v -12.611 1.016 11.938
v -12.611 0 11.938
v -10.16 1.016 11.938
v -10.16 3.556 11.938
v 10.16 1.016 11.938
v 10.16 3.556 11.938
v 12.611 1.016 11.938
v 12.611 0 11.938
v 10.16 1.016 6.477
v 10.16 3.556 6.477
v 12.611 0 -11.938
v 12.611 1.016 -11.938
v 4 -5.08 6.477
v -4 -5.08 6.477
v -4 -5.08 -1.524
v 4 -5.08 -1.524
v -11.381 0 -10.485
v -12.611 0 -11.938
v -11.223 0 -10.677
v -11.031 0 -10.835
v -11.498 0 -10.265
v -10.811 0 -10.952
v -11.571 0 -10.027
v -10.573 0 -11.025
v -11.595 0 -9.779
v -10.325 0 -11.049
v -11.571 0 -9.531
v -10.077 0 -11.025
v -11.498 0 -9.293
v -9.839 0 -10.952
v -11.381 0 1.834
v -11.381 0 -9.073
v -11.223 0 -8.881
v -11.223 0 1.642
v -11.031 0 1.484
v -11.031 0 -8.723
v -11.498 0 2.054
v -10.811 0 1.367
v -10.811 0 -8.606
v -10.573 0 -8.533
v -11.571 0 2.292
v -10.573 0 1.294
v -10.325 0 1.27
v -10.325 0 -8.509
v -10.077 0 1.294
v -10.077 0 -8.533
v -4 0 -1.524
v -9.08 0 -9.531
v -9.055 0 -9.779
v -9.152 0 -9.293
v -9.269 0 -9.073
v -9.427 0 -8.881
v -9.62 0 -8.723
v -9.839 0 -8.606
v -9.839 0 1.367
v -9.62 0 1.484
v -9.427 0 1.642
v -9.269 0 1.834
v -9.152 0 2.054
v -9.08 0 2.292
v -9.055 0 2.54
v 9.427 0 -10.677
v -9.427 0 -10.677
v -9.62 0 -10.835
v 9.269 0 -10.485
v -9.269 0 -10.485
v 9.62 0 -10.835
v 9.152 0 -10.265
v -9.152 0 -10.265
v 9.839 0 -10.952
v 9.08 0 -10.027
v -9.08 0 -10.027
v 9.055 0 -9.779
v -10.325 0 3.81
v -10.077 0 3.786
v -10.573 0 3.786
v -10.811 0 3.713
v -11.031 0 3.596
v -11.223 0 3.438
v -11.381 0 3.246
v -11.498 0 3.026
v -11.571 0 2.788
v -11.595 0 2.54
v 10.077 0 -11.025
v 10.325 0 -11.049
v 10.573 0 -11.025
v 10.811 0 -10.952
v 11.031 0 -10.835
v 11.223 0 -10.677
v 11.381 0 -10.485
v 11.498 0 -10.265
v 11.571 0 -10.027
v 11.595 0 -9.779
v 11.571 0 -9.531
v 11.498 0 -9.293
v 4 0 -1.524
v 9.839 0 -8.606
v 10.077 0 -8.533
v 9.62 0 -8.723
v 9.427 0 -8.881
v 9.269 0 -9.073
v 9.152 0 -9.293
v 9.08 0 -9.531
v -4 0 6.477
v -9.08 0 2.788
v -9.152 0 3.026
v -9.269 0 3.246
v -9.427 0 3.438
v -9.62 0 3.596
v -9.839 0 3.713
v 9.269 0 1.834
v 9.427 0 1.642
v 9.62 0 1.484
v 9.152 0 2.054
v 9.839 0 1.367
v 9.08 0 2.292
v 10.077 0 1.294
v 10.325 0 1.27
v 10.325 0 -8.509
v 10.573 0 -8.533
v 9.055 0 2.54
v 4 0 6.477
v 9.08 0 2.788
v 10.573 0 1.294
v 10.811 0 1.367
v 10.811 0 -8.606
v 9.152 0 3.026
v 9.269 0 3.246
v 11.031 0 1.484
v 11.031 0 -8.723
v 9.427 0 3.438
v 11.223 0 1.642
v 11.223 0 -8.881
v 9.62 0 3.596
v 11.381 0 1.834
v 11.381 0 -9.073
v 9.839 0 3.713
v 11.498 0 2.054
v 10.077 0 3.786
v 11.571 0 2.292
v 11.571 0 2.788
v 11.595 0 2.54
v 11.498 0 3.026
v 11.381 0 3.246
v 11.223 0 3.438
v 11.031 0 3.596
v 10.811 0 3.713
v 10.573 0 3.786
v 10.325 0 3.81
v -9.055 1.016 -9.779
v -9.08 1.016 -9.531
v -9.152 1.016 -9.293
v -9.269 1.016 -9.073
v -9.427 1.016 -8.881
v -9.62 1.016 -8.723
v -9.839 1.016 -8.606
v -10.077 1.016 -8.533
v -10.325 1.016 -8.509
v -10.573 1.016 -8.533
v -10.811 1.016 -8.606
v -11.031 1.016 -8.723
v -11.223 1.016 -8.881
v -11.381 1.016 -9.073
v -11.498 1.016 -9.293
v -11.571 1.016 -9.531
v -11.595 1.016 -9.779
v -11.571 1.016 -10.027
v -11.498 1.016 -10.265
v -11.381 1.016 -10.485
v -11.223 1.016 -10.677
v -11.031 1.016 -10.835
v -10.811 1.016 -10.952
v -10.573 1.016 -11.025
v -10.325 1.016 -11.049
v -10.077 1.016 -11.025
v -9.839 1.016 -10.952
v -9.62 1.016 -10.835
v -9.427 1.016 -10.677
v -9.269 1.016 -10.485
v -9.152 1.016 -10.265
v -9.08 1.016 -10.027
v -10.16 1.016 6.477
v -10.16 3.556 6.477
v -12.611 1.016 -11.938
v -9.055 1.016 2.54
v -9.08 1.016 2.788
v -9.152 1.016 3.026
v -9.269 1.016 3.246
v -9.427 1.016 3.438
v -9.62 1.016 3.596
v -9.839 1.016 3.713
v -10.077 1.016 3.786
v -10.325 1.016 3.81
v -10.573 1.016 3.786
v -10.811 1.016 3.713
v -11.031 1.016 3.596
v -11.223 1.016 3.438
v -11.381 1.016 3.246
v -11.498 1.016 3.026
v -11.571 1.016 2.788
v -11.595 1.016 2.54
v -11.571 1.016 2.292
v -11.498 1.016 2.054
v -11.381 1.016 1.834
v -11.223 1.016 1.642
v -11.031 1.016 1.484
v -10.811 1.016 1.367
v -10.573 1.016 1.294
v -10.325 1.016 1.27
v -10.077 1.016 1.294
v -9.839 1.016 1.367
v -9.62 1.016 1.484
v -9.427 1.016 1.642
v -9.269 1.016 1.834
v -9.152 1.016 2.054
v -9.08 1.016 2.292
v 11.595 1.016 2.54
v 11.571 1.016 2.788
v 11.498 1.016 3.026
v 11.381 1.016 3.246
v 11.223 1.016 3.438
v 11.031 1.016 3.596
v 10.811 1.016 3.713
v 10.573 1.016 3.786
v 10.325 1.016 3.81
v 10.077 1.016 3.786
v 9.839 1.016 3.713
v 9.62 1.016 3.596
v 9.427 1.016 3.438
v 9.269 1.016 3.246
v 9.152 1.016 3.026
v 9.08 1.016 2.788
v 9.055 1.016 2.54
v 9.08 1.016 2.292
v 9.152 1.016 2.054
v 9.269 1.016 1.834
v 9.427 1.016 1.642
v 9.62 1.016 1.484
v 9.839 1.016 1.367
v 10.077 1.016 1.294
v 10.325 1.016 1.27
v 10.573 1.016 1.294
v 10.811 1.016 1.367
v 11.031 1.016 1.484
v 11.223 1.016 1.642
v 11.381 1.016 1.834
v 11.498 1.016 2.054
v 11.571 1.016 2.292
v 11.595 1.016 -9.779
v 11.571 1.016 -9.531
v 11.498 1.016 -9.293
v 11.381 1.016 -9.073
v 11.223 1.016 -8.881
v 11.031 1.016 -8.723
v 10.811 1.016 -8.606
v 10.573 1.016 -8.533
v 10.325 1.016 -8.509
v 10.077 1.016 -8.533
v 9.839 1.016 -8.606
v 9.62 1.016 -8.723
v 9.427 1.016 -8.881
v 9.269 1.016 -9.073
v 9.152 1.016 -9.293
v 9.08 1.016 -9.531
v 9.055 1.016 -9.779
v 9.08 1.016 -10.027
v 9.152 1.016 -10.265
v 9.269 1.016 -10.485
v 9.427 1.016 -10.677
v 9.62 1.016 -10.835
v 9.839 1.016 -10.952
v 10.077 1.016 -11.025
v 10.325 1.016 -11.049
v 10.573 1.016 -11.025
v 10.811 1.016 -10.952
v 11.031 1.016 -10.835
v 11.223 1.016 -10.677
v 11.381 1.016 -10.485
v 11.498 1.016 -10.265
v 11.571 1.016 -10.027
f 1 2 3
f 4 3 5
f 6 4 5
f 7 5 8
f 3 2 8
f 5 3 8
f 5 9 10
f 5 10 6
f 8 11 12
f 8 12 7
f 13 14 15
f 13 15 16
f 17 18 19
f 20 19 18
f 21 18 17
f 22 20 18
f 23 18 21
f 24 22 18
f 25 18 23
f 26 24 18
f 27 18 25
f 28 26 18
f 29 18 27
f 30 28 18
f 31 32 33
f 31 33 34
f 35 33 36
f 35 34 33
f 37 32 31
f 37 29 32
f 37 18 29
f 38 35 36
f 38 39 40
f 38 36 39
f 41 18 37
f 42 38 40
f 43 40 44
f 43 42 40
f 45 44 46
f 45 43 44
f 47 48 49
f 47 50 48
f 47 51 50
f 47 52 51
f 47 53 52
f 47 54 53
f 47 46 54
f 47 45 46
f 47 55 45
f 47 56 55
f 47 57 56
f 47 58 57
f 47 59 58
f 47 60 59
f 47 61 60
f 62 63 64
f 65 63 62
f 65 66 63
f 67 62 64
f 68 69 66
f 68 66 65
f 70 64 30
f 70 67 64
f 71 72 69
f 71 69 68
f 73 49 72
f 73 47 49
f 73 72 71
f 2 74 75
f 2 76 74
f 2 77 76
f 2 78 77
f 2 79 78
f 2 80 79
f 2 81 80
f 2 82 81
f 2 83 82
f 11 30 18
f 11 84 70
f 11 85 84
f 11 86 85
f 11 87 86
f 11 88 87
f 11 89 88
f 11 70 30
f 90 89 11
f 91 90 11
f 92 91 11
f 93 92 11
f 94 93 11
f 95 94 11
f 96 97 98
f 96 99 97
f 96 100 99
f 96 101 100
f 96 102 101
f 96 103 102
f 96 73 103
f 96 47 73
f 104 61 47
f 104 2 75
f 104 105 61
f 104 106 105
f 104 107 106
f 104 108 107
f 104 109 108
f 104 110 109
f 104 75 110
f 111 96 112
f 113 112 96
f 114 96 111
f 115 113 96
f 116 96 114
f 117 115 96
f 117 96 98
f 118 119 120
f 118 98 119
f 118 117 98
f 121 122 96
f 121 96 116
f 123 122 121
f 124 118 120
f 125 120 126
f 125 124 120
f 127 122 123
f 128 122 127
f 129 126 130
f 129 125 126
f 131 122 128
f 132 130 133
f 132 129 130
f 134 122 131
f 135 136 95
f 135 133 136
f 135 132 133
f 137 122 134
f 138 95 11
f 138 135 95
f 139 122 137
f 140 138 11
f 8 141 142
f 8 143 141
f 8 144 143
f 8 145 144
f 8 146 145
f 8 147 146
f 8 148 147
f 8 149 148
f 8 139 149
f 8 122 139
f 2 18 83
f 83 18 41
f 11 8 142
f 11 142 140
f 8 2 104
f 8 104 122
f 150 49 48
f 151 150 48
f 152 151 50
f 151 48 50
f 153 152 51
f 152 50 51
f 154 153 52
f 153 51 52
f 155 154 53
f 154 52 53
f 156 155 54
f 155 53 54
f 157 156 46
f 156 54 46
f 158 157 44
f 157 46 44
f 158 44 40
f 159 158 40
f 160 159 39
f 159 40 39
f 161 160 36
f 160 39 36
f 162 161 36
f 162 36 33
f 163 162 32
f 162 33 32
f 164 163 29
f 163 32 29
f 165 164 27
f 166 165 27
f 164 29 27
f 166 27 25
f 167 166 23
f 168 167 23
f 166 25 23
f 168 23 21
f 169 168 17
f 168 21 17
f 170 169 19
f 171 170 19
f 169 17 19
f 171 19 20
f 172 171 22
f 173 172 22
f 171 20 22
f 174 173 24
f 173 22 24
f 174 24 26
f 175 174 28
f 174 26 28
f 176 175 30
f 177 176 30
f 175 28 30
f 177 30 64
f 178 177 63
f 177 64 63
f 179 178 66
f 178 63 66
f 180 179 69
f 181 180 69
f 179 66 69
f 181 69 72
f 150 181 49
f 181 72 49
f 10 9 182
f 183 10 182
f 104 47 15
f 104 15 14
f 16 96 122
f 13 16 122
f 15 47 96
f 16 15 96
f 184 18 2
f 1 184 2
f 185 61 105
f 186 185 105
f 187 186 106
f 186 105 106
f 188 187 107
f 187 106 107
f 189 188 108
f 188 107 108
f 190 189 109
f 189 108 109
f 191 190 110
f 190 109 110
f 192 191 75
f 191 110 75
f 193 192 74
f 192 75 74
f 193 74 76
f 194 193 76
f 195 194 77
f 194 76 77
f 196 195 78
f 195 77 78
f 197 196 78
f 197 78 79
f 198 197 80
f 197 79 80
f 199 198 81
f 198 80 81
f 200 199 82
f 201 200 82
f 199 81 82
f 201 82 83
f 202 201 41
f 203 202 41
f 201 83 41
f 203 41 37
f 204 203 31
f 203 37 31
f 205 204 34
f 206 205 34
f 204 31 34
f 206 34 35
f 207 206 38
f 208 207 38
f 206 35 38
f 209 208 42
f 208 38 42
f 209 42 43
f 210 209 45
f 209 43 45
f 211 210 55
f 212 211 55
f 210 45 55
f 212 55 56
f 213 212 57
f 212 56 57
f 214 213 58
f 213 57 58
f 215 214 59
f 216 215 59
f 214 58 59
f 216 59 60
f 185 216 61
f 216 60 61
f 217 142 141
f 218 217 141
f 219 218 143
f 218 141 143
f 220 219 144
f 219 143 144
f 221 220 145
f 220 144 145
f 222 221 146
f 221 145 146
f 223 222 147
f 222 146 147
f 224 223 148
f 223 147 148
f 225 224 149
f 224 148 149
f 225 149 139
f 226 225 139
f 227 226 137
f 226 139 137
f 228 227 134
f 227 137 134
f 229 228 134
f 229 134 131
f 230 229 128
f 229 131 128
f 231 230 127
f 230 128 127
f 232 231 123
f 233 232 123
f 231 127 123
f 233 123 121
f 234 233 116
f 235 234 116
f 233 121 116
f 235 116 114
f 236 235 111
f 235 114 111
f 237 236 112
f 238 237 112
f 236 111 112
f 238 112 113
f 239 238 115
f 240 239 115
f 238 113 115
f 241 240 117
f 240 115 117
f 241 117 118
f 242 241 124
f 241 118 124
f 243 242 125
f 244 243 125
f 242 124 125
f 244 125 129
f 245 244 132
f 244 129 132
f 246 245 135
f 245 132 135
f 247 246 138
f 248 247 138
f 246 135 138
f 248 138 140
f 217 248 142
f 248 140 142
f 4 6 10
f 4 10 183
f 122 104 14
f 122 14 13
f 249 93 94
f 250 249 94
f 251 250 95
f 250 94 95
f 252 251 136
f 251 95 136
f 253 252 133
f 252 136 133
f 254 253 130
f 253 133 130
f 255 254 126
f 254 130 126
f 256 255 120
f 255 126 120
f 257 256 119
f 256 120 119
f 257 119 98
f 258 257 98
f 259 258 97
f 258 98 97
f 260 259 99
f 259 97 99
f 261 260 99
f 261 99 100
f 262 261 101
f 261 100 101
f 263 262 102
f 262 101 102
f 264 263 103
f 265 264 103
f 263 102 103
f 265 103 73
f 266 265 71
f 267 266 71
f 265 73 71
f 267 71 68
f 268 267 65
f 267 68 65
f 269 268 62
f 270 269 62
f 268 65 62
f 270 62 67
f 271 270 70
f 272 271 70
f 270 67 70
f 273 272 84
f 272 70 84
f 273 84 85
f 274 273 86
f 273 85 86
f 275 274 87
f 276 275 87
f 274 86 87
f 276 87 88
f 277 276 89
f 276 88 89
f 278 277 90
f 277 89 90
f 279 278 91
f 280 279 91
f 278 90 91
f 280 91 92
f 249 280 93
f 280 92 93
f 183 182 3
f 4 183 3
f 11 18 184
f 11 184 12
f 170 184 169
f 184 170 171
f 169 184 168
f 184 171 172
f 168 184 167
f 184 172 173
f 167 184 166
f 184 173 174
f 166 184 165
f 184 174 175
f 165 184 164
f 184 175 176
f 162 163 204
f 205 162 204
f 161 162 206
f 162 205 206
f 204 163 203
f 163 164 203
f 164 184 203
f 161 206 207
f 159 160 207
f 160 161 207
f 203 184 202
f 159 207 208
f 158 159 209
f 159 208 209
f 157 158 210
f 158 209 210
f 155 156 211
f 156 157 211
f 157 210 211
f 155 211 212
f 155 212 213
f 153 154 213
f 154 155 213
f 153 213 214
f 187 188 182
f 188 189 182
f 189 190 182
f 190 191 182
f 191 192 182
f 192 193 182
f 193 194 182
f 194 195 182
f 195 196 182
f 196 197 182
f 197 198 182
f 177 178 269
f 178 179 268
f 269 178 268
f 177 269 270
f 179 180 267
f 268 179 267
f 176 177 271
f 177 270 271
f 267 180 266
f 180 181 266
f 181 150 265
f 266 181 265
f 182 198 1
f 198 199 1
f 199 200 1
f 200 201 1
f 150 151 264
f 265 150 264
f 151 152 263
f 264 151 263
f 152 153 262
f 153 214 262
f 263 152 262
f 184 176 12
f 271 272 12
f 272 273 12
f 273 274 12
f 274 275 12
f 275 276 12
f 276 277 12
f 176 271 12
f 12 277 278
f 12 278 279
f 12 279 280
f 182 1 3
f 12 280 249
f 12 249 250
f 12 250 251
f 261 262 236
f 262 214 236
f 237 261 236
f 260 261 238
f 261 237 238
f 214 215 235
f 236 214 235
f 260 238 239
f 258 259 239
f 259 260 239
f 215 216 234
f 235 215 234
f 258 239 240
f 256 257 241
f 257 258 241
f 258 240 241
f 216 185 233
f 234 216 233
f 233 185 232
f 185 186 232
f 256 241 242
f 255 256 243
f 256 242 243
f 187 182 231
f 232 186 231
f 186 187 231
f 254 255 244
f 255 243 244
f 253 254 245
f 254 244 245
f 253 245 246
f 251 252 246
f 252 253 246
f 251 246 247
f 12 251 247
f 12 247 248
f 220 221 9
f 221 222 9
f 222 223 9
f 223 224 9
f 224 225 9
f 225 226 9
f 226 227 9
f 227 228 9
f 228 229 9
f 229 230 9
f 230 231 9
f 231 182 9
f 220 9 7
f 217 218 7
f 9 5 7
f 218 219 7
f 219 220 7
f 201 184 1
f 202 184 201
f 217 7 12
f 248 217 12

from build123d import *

# Parameters (mm, degrees)
F0_W     = 25.2222
F0_H     = 23.876
F0_R     = 1.27
F1_DEPTH = 1.016
F2_W     = 8.001
F2_H     = 8.001
F3_DEPTH = 5.08
F4_W     = 20.32
F4_H     = 5.461
F5_DEPTH = 2.54


with BuildPart() as f1:
    # F0 (on Front) → F1 (new body)
    with BuildSketch(Plane.XZ):
        Rectangle(F0_W, F0_H)
        with Locations((-10.3251, -9.779)):
            Circle(F0_R, mode=Mode.SUBTRACT)
        with Locations((10.3251, -9.779)):
            Circle(F0_R, mode=Mode.SUBTRACT)
        with Locations((-10.3251, 2.54)):
            Circle(F0_R, mode=Mode.SUBTRACT)
        with Locations((10.3251, 2.54)):
            Circle(F0_R, mode=Mode.SUBTRACT)
    extrude(amount=-F1_DEPTH)

    # F2 (on face) → F3 (join)
    with BuildSketch(Plane.XZ):
        with Locations((0, 2.4765)):
            Rectangle(F2_W, F2_H)
    extrude(amount=F3_DEPTH)

    # F4 (on face) → F5 (join)
    with BuildSketch(Plane(origin=(0, 1.016, 0), x_dir=(-1, 0, 0), z_dir=(0, 1, 0))):
        with Locations((0, 9.2075)):
            Rectangle(F4_W, F4_H)
    extrude(amount=F5_DEPTH)


solid = f1.part
